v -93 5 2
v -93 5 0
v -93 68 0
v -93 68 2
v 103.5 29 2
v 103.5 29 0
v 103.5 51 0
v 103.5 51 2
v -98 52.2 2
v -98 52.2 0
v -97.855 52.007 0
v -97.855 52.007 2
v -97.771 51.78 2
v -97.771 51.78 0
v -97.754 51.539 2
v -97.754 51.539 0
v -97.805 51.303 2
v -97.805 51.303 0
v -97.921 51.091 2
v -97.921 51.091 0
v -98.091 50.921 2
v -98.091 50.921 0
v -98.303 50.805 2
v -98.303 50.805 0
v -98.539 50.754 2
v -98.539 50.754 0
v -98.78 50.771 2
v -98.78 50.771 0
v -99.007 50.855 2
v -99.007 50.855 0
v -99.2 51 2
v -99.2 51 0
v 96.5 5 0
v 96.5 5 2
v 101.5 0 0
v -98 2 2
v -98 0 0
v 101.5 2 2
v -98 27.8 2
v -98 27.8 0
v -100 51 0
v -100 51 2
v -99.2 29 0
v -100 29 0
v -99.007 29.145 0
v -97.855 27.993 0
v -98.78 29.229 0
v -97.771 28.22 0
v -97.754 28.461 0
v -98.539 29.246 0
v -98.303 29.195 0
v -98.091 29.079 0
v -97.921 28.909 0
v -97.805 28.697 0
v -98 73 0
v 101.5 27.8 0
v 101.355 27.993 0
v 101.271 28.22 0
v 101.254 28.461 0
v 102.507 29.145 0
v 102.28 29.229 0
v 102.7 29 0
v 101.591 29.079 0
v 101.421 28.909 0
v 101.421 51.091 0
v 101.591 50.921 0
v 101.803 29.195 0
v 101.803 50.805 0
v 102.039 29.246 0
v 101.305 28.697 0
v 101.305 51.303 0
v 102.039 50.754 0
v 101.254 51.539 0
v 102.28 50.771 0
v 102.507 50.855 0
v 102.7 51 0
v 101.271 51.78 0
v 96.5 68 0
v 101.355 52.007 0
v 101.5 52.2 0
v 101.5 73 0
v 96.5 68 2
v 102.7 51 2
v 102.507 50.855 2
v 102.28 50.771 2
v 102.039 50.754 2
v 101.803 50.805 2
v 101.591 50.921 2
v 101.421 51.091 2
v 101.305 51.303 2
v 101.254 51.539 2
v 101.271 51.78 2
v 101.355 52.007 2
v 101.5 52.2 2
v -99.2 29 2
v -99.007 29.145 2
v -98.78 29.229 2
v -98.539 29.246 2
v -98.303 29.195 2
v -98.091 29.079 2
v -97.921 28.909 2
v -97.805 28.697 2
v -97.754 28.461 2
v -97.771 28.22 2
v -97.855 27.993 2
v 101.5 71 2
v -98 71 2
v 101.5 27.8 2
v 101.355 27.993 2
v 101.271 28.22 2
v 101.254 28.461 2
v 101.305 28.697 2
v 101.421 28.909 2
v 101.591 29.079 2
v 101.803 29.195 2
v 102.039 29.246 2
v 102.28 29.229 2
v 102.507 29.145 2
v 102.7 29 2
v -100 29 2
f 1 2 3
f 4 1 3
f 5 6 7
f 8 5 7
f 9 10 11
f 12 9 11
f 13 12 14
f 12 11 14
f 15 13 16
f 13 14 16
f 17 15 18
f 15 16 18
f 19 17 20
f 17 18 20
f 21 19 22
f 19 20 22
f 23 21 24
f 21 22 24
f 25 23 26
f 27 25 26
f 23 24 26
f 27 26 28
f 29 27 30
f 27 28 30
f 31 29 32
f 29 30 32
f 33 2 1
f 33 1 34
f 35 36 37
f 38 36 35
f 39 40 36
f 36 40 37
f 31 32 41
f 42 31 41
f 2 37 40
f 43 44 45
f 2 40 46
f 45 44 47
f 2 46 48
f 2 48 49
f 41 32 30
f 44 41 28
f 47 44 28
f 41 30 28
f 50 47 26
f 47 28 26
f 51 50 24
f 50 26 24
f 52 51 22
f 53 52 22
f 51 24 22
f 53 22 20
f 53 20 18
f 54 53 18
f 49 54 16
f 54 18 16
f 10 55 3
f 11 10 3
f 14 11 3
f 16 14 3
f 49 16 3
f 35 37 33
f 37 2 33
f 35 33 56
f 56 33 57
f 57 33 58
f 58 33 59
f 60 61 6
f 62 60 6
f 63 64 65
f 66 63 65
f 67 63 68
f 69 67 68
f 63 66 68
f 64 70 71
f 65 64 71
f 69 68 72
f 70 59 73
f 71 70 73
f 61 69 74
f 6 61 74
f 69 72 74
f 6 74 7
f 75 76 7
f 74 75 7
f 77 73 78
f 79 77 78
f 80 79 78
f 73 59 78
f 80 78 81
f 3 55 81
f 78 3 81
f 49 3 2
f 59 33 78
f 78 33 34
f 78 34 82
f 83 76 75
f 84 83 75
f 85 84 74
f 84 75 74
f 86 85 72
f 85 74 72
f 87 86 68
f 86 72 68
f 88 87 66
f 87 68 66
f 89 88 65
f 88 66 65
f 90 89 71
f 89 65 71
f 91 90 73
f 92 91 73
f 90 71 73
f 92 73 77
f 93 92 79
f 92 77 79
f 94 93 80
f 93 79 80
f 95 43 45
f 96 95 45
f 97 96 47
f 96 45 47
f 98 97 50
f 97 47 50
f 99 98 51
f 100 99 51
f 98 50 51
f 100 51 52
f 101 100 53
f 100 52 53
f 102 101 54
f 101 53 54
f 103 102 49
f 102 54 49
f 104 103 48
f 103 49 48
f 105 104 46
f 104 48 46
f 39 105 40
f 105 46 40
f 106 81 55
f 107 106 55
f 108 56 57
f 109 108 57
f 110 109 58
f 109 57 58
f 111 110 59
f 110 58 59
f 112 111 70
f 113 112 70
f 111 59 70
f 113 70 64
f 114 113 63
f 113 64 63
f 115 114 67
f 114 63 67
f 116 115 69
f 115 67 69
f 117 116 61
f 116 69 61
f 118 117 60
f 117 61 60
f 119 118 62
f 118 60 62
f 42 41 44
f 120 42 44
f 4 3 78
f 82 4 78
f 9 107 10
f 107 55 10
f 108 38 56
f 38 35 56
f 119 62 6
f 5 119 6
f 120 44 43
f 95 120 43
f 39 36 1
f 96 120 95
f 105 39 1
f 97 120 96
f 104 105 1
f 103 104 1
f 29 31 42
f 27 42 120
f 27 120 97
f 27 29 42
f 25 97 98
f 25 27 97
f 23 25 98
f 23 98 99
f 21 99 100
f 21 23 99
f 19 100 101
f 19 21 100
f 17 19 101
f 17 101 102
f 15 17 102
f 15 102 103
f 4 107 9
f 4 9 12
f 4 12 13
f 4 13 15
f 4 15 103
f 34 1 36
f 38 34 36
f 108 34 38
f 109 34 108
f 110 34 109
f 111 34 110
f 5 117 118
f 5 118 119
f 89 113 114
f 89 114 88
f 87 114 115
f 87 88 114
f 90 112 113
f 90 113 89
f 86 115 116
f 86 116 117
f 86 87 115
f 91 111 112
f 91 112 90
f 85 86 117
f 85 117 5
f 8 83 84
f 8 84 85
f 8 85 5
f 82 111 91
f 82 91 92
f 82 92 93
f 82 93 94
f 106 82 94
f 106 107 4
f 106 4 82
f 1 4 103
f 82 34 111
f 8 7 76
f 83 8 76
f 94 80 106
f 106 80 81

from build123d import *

# Parameters (mm, degrees)
F0_W     = 189.5
F0_H     = 63
F1_DEPTH = 2
F2_SIZE  = 1.99999
F3_SIZE  = 1.99999


# Not quite as in the source:
# - a fillet or chamfer is up to 0.001 mm smaller than in the source, because OpenCascade refuses the exact size


with BuildPart() as f1:
    # F0 (on Top) → F1 (new body)
    with BuildSketch(Plane.XY):
        with BuildLine():
            Line((-99.2, 51), (-100, 51))
            Line((-100, 51), (-100, 29))
            Line((-100, 29), (-99.2, 29))
            ThreePointArc((-99.2, 29), (-98, 29), (-98, 27.8))
            Line((-98, 27.8), (-98, 0))
            Line((-98, 0), (101.5, 0))
            Line((101.5, 0), (101.5, 27.8))
            ThreePointArc((101.5, 27.8), (101.5, 29), (102.7, 29))
            Line((102.7, 29), (103.5, 29))
            Line((103.5, 29), (103.5, 51))
            Line((103.5, 51), (102.7, 51))
            ThreePointArc((102.7, 51), (101.5, 51), (101.5, 52.2))
            Line((101.5, 52.2), (101.5, 73))
            Line((101.5, 73), (-98, 73))
            Line((-98, 73), (-98, 52.2))
            ThreePointArc((-98, 52.2), (-98, 51), (-99.2, 51))
        make_face()
        with Locations((1.75, 36.5)):
            Rectangle(F0_W, F0_H, mode=Mode.SUBTRACT)
    extrude(amount=F1_DEPTH)

    # F2 (size 2 in the source; OpenCascade refuses exactly that, so slightly less here)
    f2_edges = [f1.edges().sort_by_distance(p)[0] for p in [
        (1.75, 0, 2),
    ]]
    chamfer(f2_edges, length=F2_SIZE)

    # F3 (size 2 in the source; OpenCascade refuses exactly that, so slightly less here)
    f3_edges = [f1.edges().sort_by_distance(p)[0] for p in [
        (1.75, 73, 2),
    ]]
    chamfer(f3_edges, length=F3_SIZE)


solid = f1.part
